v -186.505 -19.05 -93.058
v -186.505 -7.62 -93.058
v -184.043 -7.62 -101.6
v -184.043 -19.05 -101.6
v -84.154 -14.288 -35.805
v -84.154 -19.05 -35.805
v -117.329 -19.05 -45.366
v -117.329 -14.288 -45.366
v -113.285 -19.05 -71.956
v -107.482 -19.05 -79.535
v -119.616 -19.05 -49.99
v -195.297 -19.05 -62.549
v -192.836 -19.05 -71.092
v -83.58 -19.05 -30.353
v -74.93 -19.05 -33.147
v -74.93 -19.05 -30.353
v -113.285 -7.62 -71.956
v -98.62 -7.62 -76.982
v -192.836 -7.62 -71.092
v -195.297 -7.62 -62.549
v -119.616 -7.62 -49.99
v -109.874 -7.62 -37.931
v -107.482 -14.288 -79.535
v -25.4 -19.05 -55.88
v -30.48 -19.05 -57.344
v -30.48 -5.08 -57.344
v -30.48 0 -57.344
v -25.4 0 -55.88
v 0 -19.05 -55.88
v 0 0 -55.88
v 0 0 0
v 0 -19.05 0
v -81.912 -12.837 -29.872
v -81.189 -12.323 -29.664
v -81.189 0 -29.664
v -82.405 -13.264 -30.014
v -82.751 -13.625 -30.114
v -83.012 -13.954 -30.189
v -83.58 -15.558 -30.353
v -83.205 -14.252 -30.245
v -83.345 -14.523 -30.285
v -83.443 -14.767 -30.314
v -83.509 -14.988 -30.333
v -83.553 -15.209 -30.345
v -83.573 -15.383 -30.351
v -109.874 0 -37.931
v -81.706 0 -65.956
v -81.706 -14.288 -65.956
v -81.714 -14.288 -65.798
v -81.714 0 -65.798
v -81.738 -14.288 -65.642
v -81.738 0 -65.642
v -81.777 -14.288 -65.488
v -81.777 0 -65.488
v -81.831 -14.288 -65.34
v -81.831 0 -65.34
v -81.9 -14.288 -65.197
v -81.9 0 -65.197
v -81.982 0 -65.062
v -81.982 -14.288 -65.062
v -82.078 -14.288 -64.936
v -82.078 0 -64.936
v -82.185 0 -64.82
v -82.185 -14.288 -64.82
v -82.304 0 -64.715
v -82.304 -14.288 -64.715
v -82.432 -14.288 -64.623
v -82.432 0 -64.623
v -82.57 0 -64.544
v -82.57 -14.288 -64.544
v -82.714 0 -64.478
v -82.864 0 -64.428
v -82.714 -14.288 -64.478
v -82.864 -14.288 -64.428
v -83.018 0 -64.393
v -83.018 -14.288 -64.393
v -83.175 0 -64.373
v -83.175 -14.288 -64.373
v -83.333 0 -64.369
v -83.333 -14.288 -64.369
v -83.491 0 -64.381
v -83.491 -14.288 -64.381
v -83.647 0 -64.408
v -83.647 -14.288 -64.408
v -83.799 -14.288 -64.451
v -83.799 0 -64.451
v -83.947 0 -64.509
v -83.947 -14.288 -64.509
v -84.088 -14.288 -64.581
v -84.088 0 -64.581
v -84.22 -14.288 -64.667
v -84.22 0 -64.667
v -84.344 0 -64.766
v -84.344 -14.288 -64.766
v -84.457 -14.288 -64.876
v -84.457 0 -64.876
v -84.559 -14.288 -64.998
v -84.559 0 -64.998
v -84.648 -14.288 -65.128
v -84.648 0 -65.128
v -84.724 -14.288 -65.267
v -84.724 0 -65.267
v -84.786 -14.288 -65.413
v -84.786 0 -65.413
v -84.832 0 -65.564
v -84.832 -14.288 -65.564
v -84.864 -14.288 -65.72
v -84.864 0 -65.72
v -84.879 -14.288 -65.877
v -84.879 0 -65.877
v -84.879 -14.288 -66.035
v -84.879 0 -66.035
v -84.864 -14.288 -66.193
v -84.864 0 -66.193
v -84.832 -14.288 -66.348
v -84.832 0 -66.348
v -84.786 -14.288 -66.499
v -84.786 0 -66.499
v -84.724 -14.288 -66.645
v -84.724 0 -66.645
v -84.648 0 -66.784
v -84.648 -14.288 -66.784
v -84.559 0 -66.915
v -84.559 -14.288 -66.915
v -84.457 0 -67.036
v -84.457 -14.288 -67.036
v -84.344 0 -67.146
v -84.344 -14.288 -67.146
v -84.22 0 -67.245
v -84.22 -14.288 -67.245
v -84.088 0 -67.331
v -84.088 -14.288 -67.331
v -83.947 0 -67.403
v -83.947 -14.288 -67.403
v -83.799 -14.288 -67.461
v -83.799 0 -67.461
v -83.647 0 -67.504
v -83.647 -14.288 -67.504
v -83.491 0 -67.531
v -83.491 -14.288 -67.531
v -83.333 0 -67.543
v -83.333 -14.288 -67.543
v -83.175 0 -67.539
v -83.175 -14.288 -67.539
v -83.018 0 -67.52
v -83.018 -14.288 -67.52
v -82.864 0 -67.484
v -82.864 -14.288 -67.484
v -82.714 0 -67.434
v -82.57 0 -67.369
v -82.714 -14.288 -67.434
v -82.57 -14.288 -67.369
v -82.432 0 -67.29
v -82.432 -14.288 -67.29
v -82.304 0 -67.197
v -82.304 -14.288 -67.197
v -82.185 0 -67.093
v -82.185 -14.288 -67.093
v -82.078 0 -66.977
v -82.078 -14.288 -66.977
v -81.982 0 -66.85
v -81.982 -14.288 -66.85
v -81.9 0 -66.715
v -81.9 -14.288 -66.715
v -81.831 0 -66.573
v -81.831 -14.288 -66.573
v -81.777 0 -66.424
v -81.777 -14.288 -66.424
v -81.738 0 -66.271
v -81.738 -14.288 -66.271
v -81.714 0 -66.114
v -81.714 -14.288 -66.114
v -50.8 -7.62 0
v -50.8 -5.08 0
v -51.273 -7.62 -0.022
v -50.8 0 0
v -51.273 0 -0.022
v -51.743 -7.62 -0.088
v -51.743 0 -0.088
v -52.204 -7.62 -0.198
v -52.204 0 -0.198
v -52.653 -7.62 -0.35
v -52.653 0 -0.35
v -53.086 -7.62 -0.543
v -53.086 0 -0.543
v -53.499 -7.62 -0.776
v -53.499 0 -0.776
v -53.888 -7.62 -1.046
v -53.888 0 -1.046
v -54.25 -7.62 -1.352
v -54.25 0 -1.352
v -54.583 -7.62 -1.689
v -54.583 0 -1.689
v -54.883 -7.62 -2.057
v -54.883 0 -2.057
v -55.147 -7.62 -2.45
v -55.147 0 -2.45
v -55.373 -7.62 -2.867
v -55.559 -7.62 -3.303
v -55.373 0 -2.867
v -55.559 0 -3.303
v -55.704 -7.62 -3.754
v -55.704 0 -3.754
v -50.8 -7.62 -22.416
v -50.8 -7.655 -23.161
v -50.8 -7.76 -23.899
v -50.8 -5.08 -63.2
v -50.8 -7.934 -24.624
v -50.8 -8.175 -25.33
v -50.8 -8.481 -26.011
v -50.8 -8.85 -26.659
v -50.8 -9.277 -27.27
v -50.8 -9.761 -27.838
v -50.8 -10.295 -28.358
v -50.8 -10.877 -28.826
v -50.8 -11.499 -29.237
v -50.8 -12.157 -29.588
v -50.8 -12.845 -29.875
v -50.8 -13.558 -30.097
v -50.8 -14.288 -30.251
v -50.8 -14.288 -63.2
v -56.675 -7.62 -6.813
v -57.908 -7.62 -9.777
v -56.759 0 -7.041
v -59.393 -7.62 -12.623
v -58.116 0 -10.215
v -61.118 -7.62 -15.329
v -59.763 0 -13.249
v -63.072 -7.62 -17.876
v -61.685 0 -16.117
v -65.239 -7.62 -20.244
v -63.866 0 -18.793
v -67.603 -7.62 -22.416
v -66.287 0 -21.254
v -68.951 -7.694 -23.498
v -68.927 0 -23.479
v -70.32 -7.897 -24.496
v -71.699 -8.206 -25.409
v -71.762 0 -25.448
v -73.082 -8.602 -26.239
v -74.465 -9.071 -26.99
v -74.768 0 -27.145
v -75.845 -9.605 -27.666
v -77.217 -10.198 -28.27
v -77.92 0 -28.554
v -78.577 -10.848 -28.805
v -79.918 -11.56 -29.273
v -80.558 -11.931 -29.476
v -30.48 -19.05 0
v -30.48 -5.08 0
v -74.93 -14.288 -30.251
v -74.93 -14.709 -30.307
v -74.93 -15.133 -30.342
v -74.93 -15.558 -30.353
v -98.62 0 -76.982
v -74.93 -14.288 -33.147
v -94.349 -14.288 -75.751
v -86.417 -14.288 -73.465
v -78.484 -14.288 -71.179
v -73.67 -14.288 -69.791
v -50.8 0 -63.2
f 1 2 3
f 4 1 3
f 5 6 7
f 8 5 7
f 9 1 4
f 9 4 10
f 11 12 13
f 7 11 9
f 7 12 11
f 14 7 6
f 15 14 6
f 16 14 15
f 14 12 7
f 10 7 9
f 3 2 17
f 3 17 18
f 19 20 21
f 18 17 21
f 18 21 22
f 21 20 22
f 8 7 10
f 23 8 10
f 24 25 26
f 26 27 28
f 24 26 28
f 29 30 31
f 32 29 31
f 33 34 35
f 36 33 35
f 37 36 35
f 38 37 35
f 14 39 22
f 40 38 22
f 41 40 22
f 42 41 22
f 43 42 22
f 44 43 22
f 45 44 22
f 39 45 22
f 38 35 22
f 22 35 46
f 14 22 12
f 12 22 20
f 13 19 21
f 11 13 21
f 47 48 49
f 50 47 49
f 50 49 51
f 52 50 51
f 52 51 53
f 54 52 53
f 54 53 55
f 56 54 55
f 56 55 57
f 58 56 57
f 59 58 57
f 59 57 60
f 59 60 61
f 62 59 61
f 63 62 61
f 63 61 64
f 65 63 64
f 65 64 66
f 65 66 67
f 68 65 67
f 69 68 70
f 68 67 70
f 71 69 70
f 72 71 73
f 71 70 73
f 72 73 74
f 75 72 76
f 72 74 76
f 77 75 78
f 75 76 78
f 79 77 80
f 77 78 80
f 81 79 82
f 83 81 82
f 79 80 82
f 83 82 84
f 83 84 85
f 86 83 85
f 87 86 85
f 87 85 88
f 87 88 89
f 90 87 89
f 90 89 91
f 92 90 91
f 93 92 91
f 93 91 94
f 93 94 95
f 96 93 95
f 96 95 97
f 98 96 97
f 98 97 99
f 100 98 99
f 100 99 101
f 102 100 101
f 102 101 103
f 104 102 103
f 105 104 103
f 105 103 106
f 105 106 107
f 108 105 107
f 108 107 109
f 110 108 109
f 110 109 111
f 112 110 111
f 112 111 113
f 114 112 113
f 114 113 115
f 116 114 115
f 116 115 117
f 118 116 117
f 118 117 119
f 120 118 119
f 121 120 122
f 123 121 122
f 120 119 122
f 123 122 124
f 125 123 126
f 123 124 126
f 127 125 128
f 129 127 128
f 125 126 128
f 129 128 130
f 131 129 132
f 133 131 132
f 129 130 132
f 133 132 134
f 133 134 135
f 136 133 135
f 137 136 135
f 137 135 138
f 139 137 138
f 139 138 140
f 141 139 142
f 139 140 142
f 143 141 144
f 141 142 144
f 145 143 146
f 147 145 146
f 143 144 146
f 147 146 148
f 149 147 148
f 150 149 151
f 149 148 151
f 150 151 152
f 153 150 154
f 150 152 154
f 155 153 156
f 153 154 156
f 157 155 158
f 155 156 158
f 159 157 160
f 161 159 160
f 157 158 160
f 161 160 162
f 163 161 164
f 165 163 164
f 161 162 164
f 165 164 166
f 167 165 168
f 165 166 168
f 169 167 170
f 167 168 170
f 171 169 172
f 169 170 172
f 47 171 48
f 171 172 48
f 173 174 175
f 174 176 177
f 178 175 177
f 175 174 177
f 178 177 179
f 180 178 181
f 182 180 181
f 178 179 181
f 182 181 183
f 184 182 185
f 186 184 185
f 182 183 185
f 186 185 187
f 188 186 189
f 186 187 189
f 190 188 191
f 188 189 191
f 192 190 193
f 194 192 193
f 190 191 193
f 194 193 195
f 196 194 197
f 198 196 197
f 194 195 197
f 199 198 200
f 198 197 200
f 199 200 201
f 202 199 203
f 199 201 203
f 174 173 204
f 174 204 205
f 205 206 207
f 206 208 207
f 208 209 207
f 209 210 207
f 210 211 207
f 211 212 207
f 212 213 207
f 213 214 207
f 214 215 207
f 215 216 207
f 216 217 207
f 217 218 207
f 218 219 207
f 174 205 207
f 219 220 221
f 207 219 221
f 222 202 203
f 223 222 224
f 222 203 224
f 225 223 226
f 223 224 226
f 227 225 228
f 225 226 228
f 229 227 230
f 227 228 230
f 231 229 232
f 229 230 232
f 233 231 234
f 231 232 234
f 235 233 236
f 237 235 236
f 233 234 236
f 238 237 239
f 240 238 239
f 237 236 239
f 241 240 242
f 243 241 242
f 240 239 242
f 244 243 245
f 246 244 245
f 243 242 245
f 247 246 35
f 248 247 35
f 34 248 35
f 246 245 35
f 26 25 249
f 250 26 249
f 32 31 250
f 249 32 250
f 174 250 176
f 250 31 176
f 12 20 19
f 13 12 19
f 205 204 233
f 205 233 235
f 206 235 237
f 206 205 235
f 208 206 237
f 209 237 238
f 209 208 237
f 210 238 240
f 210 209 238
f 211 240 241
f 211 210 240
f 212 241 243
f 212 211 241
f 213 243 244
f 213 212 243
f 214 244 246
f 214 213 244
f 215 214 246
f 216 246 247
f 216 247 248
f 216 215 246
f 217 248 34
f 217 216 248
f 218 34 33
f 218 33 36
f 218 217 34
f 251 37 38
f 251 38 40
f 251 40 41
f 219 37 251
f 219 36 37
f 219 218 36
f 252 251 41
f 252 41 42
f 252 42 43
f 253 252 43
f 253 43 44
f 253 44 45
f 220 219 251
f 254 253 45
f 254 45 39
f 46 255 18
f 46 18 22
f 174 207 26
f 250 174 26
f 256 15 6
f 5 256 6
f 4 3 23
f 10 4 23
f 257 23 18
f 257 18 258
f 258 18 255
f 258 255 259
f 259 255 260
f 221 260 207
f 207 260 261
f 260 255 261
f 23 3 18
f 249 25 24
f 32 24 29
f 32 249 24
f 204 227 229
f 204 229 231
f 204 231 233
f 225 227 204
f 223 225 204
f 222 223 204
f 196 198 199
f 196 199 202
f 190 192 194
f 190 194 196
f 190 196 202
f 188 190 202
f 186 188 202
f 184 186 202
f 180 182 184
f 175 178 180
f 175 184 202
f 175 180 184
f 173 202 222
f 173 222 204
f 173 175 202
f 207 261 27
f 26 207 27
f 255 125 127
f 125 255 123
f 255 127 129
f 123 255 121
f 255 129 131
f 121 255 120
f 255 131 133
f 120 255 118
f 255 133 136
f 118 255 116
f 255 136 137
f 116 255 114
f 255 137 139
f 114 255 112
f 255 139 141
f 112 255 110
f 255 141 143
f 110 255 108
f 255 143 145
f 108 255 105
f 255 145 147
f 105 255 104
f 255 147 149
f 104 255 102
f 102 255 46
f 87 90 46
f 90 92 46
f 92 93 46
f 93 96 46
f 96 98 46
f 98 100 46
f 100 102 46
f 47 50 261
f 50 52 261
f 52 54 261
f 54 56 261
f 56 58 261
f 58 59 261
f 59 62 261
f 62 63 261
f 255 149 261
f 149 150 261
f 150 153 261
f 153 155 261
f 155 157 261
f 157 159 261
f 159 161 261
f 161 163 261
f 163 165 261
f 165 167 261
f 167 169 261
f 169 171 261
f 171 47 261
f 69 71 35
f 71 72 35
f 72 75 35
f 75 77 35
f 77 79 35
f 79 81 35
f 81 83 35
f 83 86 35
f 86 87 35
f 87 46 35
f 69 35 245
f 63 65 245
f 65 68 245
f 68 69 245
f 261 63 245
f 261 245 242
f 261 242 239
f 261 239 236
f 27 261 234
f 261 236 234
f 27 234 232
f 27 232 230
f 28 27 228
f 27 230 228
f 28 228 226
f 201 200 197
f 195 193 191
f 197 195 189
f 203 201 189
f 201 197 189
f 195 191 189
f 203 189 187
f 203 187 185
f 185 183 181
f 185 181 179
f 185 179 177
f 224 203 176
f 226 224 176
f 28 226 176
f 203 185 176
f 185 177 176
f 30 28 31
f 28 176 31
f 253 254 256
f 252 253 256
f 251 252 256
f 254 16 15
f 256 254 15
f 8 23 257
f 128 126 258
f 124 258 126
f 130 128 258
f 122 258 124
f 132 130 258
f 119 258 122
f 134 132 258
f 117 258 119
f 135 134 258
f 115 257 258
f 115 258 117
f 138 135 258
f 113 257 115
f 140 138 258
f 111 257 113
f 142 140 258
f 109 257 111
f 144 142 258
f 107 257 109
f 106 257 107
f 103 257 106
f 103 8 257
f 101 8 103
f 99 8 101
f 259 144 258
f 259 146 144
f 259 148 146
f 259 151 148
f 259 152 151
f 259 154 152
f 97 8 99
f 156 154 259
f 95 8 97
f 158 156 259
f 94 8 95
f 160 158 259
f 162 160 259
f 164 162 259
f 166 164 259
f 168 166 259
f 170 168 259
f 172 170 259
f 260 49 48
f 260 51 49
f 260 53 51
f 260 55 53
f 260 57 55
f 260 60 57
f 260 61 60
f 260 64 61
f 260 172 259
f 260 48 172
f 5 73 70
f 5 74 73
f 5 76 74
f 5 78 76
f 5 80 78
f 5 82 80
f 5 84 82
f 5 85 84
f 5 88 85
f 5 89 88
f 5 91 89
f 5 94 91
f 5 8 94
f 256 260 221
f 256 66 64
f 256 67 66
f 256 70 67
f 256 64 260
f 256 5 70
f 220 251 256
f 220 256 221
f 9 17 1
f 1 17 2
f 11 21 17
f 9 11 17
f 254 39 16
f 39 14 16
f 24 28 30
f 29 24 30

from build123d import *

# Parameters (mm, degrees)
F1_DEPTH  = 19.05
F3_DEPTH  = 13.97
F5_DEPTH  = 7.62
F7_DEPTH  = 11.43
F8_R      = 7.9375
F9_R      = 1.5875
F10_DEPTH = 4.7625
F11_DEPTH = 19.0510001


# Not quite as in the source:
# - a feature names something its author has since deleted; it is built from what else it names


with BuildPart() as f1:
    # F0 (on Front) → F1 (new body)
    with BuildSketch(Plane.XZ):
        Polygon((0, -55.88), (0, 0), (-30.48, 0), (-30.48, -57.344024155), (-25.4, -55.88), align=None)
        with BuildLine():
            Line((-50.8, -63.2001207751), (-50.8, 0))
            ThreePointArc((-50.8, 0), (-53.8879738976, -1.0462898954), (-55.7039336667, -3.7541664537))
            ThreePointArc((-55.7039336667, -3.7541664537), (-65.0479350522, -20.0515789601), (-81.1885565746, -29.6638811382))
            Line((-81.1885565746, -29.6638811382), (-195.2974379776, -62.5493454446))
            Line((-195.2974379776, -62.5493454446), (-192.8355918237, -71.0916761286))
            Line((-192.8355918237, -71.0916761286), (-119.6156145323, -49.990137667))
            Line((-119.6156145323, -49.990137667), (-113.2851529938, -71.9561308545))
            Line((-113.2851529938, -71.9561308545), (-186.5051302853, -93.057669316))
            Line((-186.5051302853, -93.057669316), (-184.0432841314, -101.6))
            Line((-184.0432841314, -101.6), (-50.8, -63.2001207751))
        make_face()
        Polygon((-30.48, -57.344024155), (-30.48, 0), (-50.8, 0), (-50.8, -63.2001207751), align=None)
    extrude(amount=F1_DEPTH)

    # F2 (on face) → F3 (cut)
    with BuildSketch(Plane.XZ.offset(19.05)):
        Polygon((-30.48, 0), (-50.8, 0), (-50.8, -63.2001207751), (-30.48, -57.344024155), align=None)
    extrude(amount=-F3_DEPTH, mode=Mode.SUBTRACT)

    # F4 (on face) → F5 (cut)
    with BuildSketch(Plane.XZ):
        Polygon((-109.8741311376, -37.9308839061), (-195.2974379776, -62.5493454446), (-184.0432841314, -101.6), (-98.6199772914, -76.9815384615), align=None)
    extrude(amount=F5_DEPTH, mode=Mode.SUBTRACT)

    # F6 (on face) → F7 (cut)
    with BuildSketch(Plane.XZ.offset(19.05)):
        with BuildLine():
            Line((-83.9840349336, -30.353), (-50.8, -30.353))
            Line((-50.8, -30.353), (-50.8, 0))
            ThreePointArc((-50.8, 0), (-53.8879738976, -1.0462898954), (-55.7039336667, -3.7541664537))
            ThreePointArc((-55.7039336667, -3.7541664537), (-66.0773822208, -21.0582659153), (-83.9840349336, -30.353))
        make_face()
    extrude(amount=-F7_DEPTH, mode=Mode.SUBTRACT)

    # F8
    f8_edges = [f1.edges().sort_by_distance(p)[0] for p in [
        (-67.189861, -7.62, -30.353),
    ]]
    fillet(f8_edges, radius=F8_R)

    # F9 (on face) → F10 (cut)
    with BuildSketch(Plane.XZ.offset(19.05)):
        with BuildLine():
            Line((-78.4844835363, -71.1786153846), (-73.6695687, -69.790987112))
            ThreePointArc((-73.6695687, -69.7909871121), (-78.2220260856, -57.0610953752), (-78.0424581585, -43.5428570566))
            ThreePointArc((-78.0424581585, -43.5428570566), (-76.567170767, -38.1173977165), (-74.3094881962, -32.9681306475))
            Line((-74.3094881962, -32.9681306475), (-74.93, -33.1469582596))
            Line((-74.93, -33.1469582596), (-84.154369829, -35.8053638195))
            Line((-84.154369829, -35.8053638195), (-117.3289133872, -45.3660593118))
            Line((-117.3289133872, -45.3660593118), (-107.4815287718, -79.5353820478))
            Line((-107.4815287718, -79.5353820478), (-94.3488119494, -75.7506153846))
            Line((-94.3488119494, -75.7506153846), (-96.9865042571, -66.5981182232))
            Line((-96.9865042571, -66.5981182232), (-81.122175844, -62.0261182232))
            Line((-81.122175844, -62.0261182232), (-78.4844835363, -71.1786153846))
        make_face()
        Polygon((-86.4166477429, -73.4646153846), (-78.4844835363, -71.1786153846), (-81.122175844, -62.0261182232), (-96.9865042571, -66.5981182232), (-94.3488119494, -75.7506153846), align=None)
        with Locations((-93.0564411007, -68.7697198411)):
            Circle(F9_R, mode=Mode.SUBTRACT)
        with Locations((-83.2937774619, -65.9561813796)):
            Circle(F9_R, mode=Mode.SUBTRACT)
        with Locations((-83.2937774619, -65.9561813796)):
            Circle(F9_R)
        with Locations((-93.0564411007, -68.7697198411)):
            Circle(F9_R)
        with BuildLine():
            ThreePointArc((-78.0424581585, -43.5428570566), (-78.2220260856, -57.0610953752), (-73.6695687, -69.7909871121))
            Line((-73.6695687, -69.790987112), (-50.8, -63.2001207751))
            Line((-50.8, -63.2001207751), (-50.8, -53.6799892795))
            Line((-50.8, -53.6799892795), (-74.2742938603, -49.1253072525))
            ThreePointArc((-74.2742938603, -49.1253072525), (-77.3145392982, -47.1144945318), (-78.0424581585, -43.5428570566))
        make_face()
        with BuildLine():
            ThreePointArc((-74.3094881962, -32.9681306475), (-76.567170767, -38.1173977165), (-78.0424581585, -43.5428570566))
            ThreePointArc((-78.0424581585, -43.5428570566), (-72.9114890511, -39.7093483015), (-68.6046509033, -44.45))
            ThreePointArc((-68.6046509033, -44.45), (-70.3372055311, -48.1243485533), (-74.2742938603, -49.1253072525))
            Line((-74.2742938603, -49.1253072525), (-50.8, -53.6799892795))
            Line((-50.8, -53.6799892795), (-50.8, -42.2880161767))
            ThreePointArc((-50.8, -42.2880161767), (-54.8534085622, -36.9235653105), (-56.279986835, -30.353))
            Line((-56.279986835, -30.353), (-65.2352774711, -30.353))
            Line((-65.2352774711, -30.353), (-74.3094881962, -32.9681306475))
        make_face()
        with BuildLine():
            ThreePointArc((-68.6046509033, -44.45), (-72.9114890511, -39.7093483015), (-78.0424581585, -43.5428570566))
            ThreePointArc((-78.0424581585, -43.5428570566), (-77.3145392982, -47.1144945318), (-74.2742938603, -49.1253072525))
            ThreePointArc((-74.2742938603, -49.1253072525), (-70.3372055311, -48.1243485533), (-68.6046509033, -44.45))
        make_face()
        with BuildLine():
            Line((-50.8, -30.353), (-56.279986835, -30.353))
            ThreePointArc((-56.279986835, -30.353), (-54.8534085622, -36.9235653105), (-50.8, -42.2880161767))
            Line((-50.8, -42.2880161767), (-50.8, -30.353))
        make_face()
        with BuildLine():
            Line((-50.8, -28.4059811383), (-56.1527436573, -28.4059811383))
            ThreePointArc((-56.1527436573, -28.4059811383), (-56.2467573472, -29.3775043596), (-56.279986835, -30.353))
            Line((-56.279986835, -30.353), (-50.8, -30.353))
            Line((-50.8, -30.353), (-50.8, -28.4059811383))
        make_face()
        with BuildLine():
            Line((-56.1527436573, -28.4059811383), (-71.4639828579, -28.4059811383))
            ThreePointArc((-71.4639828579, -28.4059811383), (-72.1413197609, -29.3692544852), (-72.7885643692, -30.353))
            Line((-72.7885643692, -30.353), (-65.2352774711, -30.353))
            Line((-65.2352774711, -30.353), (-56.279986835, -30.353))
            ThreePointArc((-56.279986835, -30.353), (-56.2467573472, -29.3775043596), (-56.1527436573, -28.4059811383))
        make_face()
        with BuildLine():
            ThreePointArc((-72.7885643692, -30.353), (-72.1413197609, -29.3692544852), (-71.4639828579, -28.4059811383))
            Line((-71.4639828579, -28.4059811383), (-74.93, -28.4059811383))
            Line((-74.93, -28.4059811383), (-74.93, -30.353))
            Line((-74.93, -30.353), (-72.7885643692, -30.353))
        make_face()
        with BuildLine():
            ThreePointArc((-72.7885643692, -30.353), (-73.5749926059, -31.6454636692), (-74.3094881962, -32.9681306475))
            Line((-74.3094881962, -32.9681306475), (-65.2352774711, -30.353))
            Line((-65.2352774711, -30.353), (-72.7885643692, -30.353))
        make_face()
        with BuildLine():
            Line((-74.93, -33.1469582596), (-74.3094881962, -32.9681306475))
            ThreePointArc((-74.3094881962, -32.9681306475), (-73.5749926059, -31.6454636692), (-72.7885643692, -30.353))
            Line((-72.7885643692, -30.353), (-74.93, -30.353))
            Line((-74.93, -30.353), (-74.93, -33.1469582596))
        make_face()
    extrude(amount=-F10_DEPTH, mode=Mode.SUBTRACT)

    # F9 (on face) → F11 (cut, through all)
    with BuildSketch(Plane.XZ.offset(19.05)):
        with Locations((-83.2937774619, -65.9561813796)):
            Circle(F9_R)
    extrude(amount=-F11_DEPTH, mode=Mode.SUBTRACT)


solid = f1.part
